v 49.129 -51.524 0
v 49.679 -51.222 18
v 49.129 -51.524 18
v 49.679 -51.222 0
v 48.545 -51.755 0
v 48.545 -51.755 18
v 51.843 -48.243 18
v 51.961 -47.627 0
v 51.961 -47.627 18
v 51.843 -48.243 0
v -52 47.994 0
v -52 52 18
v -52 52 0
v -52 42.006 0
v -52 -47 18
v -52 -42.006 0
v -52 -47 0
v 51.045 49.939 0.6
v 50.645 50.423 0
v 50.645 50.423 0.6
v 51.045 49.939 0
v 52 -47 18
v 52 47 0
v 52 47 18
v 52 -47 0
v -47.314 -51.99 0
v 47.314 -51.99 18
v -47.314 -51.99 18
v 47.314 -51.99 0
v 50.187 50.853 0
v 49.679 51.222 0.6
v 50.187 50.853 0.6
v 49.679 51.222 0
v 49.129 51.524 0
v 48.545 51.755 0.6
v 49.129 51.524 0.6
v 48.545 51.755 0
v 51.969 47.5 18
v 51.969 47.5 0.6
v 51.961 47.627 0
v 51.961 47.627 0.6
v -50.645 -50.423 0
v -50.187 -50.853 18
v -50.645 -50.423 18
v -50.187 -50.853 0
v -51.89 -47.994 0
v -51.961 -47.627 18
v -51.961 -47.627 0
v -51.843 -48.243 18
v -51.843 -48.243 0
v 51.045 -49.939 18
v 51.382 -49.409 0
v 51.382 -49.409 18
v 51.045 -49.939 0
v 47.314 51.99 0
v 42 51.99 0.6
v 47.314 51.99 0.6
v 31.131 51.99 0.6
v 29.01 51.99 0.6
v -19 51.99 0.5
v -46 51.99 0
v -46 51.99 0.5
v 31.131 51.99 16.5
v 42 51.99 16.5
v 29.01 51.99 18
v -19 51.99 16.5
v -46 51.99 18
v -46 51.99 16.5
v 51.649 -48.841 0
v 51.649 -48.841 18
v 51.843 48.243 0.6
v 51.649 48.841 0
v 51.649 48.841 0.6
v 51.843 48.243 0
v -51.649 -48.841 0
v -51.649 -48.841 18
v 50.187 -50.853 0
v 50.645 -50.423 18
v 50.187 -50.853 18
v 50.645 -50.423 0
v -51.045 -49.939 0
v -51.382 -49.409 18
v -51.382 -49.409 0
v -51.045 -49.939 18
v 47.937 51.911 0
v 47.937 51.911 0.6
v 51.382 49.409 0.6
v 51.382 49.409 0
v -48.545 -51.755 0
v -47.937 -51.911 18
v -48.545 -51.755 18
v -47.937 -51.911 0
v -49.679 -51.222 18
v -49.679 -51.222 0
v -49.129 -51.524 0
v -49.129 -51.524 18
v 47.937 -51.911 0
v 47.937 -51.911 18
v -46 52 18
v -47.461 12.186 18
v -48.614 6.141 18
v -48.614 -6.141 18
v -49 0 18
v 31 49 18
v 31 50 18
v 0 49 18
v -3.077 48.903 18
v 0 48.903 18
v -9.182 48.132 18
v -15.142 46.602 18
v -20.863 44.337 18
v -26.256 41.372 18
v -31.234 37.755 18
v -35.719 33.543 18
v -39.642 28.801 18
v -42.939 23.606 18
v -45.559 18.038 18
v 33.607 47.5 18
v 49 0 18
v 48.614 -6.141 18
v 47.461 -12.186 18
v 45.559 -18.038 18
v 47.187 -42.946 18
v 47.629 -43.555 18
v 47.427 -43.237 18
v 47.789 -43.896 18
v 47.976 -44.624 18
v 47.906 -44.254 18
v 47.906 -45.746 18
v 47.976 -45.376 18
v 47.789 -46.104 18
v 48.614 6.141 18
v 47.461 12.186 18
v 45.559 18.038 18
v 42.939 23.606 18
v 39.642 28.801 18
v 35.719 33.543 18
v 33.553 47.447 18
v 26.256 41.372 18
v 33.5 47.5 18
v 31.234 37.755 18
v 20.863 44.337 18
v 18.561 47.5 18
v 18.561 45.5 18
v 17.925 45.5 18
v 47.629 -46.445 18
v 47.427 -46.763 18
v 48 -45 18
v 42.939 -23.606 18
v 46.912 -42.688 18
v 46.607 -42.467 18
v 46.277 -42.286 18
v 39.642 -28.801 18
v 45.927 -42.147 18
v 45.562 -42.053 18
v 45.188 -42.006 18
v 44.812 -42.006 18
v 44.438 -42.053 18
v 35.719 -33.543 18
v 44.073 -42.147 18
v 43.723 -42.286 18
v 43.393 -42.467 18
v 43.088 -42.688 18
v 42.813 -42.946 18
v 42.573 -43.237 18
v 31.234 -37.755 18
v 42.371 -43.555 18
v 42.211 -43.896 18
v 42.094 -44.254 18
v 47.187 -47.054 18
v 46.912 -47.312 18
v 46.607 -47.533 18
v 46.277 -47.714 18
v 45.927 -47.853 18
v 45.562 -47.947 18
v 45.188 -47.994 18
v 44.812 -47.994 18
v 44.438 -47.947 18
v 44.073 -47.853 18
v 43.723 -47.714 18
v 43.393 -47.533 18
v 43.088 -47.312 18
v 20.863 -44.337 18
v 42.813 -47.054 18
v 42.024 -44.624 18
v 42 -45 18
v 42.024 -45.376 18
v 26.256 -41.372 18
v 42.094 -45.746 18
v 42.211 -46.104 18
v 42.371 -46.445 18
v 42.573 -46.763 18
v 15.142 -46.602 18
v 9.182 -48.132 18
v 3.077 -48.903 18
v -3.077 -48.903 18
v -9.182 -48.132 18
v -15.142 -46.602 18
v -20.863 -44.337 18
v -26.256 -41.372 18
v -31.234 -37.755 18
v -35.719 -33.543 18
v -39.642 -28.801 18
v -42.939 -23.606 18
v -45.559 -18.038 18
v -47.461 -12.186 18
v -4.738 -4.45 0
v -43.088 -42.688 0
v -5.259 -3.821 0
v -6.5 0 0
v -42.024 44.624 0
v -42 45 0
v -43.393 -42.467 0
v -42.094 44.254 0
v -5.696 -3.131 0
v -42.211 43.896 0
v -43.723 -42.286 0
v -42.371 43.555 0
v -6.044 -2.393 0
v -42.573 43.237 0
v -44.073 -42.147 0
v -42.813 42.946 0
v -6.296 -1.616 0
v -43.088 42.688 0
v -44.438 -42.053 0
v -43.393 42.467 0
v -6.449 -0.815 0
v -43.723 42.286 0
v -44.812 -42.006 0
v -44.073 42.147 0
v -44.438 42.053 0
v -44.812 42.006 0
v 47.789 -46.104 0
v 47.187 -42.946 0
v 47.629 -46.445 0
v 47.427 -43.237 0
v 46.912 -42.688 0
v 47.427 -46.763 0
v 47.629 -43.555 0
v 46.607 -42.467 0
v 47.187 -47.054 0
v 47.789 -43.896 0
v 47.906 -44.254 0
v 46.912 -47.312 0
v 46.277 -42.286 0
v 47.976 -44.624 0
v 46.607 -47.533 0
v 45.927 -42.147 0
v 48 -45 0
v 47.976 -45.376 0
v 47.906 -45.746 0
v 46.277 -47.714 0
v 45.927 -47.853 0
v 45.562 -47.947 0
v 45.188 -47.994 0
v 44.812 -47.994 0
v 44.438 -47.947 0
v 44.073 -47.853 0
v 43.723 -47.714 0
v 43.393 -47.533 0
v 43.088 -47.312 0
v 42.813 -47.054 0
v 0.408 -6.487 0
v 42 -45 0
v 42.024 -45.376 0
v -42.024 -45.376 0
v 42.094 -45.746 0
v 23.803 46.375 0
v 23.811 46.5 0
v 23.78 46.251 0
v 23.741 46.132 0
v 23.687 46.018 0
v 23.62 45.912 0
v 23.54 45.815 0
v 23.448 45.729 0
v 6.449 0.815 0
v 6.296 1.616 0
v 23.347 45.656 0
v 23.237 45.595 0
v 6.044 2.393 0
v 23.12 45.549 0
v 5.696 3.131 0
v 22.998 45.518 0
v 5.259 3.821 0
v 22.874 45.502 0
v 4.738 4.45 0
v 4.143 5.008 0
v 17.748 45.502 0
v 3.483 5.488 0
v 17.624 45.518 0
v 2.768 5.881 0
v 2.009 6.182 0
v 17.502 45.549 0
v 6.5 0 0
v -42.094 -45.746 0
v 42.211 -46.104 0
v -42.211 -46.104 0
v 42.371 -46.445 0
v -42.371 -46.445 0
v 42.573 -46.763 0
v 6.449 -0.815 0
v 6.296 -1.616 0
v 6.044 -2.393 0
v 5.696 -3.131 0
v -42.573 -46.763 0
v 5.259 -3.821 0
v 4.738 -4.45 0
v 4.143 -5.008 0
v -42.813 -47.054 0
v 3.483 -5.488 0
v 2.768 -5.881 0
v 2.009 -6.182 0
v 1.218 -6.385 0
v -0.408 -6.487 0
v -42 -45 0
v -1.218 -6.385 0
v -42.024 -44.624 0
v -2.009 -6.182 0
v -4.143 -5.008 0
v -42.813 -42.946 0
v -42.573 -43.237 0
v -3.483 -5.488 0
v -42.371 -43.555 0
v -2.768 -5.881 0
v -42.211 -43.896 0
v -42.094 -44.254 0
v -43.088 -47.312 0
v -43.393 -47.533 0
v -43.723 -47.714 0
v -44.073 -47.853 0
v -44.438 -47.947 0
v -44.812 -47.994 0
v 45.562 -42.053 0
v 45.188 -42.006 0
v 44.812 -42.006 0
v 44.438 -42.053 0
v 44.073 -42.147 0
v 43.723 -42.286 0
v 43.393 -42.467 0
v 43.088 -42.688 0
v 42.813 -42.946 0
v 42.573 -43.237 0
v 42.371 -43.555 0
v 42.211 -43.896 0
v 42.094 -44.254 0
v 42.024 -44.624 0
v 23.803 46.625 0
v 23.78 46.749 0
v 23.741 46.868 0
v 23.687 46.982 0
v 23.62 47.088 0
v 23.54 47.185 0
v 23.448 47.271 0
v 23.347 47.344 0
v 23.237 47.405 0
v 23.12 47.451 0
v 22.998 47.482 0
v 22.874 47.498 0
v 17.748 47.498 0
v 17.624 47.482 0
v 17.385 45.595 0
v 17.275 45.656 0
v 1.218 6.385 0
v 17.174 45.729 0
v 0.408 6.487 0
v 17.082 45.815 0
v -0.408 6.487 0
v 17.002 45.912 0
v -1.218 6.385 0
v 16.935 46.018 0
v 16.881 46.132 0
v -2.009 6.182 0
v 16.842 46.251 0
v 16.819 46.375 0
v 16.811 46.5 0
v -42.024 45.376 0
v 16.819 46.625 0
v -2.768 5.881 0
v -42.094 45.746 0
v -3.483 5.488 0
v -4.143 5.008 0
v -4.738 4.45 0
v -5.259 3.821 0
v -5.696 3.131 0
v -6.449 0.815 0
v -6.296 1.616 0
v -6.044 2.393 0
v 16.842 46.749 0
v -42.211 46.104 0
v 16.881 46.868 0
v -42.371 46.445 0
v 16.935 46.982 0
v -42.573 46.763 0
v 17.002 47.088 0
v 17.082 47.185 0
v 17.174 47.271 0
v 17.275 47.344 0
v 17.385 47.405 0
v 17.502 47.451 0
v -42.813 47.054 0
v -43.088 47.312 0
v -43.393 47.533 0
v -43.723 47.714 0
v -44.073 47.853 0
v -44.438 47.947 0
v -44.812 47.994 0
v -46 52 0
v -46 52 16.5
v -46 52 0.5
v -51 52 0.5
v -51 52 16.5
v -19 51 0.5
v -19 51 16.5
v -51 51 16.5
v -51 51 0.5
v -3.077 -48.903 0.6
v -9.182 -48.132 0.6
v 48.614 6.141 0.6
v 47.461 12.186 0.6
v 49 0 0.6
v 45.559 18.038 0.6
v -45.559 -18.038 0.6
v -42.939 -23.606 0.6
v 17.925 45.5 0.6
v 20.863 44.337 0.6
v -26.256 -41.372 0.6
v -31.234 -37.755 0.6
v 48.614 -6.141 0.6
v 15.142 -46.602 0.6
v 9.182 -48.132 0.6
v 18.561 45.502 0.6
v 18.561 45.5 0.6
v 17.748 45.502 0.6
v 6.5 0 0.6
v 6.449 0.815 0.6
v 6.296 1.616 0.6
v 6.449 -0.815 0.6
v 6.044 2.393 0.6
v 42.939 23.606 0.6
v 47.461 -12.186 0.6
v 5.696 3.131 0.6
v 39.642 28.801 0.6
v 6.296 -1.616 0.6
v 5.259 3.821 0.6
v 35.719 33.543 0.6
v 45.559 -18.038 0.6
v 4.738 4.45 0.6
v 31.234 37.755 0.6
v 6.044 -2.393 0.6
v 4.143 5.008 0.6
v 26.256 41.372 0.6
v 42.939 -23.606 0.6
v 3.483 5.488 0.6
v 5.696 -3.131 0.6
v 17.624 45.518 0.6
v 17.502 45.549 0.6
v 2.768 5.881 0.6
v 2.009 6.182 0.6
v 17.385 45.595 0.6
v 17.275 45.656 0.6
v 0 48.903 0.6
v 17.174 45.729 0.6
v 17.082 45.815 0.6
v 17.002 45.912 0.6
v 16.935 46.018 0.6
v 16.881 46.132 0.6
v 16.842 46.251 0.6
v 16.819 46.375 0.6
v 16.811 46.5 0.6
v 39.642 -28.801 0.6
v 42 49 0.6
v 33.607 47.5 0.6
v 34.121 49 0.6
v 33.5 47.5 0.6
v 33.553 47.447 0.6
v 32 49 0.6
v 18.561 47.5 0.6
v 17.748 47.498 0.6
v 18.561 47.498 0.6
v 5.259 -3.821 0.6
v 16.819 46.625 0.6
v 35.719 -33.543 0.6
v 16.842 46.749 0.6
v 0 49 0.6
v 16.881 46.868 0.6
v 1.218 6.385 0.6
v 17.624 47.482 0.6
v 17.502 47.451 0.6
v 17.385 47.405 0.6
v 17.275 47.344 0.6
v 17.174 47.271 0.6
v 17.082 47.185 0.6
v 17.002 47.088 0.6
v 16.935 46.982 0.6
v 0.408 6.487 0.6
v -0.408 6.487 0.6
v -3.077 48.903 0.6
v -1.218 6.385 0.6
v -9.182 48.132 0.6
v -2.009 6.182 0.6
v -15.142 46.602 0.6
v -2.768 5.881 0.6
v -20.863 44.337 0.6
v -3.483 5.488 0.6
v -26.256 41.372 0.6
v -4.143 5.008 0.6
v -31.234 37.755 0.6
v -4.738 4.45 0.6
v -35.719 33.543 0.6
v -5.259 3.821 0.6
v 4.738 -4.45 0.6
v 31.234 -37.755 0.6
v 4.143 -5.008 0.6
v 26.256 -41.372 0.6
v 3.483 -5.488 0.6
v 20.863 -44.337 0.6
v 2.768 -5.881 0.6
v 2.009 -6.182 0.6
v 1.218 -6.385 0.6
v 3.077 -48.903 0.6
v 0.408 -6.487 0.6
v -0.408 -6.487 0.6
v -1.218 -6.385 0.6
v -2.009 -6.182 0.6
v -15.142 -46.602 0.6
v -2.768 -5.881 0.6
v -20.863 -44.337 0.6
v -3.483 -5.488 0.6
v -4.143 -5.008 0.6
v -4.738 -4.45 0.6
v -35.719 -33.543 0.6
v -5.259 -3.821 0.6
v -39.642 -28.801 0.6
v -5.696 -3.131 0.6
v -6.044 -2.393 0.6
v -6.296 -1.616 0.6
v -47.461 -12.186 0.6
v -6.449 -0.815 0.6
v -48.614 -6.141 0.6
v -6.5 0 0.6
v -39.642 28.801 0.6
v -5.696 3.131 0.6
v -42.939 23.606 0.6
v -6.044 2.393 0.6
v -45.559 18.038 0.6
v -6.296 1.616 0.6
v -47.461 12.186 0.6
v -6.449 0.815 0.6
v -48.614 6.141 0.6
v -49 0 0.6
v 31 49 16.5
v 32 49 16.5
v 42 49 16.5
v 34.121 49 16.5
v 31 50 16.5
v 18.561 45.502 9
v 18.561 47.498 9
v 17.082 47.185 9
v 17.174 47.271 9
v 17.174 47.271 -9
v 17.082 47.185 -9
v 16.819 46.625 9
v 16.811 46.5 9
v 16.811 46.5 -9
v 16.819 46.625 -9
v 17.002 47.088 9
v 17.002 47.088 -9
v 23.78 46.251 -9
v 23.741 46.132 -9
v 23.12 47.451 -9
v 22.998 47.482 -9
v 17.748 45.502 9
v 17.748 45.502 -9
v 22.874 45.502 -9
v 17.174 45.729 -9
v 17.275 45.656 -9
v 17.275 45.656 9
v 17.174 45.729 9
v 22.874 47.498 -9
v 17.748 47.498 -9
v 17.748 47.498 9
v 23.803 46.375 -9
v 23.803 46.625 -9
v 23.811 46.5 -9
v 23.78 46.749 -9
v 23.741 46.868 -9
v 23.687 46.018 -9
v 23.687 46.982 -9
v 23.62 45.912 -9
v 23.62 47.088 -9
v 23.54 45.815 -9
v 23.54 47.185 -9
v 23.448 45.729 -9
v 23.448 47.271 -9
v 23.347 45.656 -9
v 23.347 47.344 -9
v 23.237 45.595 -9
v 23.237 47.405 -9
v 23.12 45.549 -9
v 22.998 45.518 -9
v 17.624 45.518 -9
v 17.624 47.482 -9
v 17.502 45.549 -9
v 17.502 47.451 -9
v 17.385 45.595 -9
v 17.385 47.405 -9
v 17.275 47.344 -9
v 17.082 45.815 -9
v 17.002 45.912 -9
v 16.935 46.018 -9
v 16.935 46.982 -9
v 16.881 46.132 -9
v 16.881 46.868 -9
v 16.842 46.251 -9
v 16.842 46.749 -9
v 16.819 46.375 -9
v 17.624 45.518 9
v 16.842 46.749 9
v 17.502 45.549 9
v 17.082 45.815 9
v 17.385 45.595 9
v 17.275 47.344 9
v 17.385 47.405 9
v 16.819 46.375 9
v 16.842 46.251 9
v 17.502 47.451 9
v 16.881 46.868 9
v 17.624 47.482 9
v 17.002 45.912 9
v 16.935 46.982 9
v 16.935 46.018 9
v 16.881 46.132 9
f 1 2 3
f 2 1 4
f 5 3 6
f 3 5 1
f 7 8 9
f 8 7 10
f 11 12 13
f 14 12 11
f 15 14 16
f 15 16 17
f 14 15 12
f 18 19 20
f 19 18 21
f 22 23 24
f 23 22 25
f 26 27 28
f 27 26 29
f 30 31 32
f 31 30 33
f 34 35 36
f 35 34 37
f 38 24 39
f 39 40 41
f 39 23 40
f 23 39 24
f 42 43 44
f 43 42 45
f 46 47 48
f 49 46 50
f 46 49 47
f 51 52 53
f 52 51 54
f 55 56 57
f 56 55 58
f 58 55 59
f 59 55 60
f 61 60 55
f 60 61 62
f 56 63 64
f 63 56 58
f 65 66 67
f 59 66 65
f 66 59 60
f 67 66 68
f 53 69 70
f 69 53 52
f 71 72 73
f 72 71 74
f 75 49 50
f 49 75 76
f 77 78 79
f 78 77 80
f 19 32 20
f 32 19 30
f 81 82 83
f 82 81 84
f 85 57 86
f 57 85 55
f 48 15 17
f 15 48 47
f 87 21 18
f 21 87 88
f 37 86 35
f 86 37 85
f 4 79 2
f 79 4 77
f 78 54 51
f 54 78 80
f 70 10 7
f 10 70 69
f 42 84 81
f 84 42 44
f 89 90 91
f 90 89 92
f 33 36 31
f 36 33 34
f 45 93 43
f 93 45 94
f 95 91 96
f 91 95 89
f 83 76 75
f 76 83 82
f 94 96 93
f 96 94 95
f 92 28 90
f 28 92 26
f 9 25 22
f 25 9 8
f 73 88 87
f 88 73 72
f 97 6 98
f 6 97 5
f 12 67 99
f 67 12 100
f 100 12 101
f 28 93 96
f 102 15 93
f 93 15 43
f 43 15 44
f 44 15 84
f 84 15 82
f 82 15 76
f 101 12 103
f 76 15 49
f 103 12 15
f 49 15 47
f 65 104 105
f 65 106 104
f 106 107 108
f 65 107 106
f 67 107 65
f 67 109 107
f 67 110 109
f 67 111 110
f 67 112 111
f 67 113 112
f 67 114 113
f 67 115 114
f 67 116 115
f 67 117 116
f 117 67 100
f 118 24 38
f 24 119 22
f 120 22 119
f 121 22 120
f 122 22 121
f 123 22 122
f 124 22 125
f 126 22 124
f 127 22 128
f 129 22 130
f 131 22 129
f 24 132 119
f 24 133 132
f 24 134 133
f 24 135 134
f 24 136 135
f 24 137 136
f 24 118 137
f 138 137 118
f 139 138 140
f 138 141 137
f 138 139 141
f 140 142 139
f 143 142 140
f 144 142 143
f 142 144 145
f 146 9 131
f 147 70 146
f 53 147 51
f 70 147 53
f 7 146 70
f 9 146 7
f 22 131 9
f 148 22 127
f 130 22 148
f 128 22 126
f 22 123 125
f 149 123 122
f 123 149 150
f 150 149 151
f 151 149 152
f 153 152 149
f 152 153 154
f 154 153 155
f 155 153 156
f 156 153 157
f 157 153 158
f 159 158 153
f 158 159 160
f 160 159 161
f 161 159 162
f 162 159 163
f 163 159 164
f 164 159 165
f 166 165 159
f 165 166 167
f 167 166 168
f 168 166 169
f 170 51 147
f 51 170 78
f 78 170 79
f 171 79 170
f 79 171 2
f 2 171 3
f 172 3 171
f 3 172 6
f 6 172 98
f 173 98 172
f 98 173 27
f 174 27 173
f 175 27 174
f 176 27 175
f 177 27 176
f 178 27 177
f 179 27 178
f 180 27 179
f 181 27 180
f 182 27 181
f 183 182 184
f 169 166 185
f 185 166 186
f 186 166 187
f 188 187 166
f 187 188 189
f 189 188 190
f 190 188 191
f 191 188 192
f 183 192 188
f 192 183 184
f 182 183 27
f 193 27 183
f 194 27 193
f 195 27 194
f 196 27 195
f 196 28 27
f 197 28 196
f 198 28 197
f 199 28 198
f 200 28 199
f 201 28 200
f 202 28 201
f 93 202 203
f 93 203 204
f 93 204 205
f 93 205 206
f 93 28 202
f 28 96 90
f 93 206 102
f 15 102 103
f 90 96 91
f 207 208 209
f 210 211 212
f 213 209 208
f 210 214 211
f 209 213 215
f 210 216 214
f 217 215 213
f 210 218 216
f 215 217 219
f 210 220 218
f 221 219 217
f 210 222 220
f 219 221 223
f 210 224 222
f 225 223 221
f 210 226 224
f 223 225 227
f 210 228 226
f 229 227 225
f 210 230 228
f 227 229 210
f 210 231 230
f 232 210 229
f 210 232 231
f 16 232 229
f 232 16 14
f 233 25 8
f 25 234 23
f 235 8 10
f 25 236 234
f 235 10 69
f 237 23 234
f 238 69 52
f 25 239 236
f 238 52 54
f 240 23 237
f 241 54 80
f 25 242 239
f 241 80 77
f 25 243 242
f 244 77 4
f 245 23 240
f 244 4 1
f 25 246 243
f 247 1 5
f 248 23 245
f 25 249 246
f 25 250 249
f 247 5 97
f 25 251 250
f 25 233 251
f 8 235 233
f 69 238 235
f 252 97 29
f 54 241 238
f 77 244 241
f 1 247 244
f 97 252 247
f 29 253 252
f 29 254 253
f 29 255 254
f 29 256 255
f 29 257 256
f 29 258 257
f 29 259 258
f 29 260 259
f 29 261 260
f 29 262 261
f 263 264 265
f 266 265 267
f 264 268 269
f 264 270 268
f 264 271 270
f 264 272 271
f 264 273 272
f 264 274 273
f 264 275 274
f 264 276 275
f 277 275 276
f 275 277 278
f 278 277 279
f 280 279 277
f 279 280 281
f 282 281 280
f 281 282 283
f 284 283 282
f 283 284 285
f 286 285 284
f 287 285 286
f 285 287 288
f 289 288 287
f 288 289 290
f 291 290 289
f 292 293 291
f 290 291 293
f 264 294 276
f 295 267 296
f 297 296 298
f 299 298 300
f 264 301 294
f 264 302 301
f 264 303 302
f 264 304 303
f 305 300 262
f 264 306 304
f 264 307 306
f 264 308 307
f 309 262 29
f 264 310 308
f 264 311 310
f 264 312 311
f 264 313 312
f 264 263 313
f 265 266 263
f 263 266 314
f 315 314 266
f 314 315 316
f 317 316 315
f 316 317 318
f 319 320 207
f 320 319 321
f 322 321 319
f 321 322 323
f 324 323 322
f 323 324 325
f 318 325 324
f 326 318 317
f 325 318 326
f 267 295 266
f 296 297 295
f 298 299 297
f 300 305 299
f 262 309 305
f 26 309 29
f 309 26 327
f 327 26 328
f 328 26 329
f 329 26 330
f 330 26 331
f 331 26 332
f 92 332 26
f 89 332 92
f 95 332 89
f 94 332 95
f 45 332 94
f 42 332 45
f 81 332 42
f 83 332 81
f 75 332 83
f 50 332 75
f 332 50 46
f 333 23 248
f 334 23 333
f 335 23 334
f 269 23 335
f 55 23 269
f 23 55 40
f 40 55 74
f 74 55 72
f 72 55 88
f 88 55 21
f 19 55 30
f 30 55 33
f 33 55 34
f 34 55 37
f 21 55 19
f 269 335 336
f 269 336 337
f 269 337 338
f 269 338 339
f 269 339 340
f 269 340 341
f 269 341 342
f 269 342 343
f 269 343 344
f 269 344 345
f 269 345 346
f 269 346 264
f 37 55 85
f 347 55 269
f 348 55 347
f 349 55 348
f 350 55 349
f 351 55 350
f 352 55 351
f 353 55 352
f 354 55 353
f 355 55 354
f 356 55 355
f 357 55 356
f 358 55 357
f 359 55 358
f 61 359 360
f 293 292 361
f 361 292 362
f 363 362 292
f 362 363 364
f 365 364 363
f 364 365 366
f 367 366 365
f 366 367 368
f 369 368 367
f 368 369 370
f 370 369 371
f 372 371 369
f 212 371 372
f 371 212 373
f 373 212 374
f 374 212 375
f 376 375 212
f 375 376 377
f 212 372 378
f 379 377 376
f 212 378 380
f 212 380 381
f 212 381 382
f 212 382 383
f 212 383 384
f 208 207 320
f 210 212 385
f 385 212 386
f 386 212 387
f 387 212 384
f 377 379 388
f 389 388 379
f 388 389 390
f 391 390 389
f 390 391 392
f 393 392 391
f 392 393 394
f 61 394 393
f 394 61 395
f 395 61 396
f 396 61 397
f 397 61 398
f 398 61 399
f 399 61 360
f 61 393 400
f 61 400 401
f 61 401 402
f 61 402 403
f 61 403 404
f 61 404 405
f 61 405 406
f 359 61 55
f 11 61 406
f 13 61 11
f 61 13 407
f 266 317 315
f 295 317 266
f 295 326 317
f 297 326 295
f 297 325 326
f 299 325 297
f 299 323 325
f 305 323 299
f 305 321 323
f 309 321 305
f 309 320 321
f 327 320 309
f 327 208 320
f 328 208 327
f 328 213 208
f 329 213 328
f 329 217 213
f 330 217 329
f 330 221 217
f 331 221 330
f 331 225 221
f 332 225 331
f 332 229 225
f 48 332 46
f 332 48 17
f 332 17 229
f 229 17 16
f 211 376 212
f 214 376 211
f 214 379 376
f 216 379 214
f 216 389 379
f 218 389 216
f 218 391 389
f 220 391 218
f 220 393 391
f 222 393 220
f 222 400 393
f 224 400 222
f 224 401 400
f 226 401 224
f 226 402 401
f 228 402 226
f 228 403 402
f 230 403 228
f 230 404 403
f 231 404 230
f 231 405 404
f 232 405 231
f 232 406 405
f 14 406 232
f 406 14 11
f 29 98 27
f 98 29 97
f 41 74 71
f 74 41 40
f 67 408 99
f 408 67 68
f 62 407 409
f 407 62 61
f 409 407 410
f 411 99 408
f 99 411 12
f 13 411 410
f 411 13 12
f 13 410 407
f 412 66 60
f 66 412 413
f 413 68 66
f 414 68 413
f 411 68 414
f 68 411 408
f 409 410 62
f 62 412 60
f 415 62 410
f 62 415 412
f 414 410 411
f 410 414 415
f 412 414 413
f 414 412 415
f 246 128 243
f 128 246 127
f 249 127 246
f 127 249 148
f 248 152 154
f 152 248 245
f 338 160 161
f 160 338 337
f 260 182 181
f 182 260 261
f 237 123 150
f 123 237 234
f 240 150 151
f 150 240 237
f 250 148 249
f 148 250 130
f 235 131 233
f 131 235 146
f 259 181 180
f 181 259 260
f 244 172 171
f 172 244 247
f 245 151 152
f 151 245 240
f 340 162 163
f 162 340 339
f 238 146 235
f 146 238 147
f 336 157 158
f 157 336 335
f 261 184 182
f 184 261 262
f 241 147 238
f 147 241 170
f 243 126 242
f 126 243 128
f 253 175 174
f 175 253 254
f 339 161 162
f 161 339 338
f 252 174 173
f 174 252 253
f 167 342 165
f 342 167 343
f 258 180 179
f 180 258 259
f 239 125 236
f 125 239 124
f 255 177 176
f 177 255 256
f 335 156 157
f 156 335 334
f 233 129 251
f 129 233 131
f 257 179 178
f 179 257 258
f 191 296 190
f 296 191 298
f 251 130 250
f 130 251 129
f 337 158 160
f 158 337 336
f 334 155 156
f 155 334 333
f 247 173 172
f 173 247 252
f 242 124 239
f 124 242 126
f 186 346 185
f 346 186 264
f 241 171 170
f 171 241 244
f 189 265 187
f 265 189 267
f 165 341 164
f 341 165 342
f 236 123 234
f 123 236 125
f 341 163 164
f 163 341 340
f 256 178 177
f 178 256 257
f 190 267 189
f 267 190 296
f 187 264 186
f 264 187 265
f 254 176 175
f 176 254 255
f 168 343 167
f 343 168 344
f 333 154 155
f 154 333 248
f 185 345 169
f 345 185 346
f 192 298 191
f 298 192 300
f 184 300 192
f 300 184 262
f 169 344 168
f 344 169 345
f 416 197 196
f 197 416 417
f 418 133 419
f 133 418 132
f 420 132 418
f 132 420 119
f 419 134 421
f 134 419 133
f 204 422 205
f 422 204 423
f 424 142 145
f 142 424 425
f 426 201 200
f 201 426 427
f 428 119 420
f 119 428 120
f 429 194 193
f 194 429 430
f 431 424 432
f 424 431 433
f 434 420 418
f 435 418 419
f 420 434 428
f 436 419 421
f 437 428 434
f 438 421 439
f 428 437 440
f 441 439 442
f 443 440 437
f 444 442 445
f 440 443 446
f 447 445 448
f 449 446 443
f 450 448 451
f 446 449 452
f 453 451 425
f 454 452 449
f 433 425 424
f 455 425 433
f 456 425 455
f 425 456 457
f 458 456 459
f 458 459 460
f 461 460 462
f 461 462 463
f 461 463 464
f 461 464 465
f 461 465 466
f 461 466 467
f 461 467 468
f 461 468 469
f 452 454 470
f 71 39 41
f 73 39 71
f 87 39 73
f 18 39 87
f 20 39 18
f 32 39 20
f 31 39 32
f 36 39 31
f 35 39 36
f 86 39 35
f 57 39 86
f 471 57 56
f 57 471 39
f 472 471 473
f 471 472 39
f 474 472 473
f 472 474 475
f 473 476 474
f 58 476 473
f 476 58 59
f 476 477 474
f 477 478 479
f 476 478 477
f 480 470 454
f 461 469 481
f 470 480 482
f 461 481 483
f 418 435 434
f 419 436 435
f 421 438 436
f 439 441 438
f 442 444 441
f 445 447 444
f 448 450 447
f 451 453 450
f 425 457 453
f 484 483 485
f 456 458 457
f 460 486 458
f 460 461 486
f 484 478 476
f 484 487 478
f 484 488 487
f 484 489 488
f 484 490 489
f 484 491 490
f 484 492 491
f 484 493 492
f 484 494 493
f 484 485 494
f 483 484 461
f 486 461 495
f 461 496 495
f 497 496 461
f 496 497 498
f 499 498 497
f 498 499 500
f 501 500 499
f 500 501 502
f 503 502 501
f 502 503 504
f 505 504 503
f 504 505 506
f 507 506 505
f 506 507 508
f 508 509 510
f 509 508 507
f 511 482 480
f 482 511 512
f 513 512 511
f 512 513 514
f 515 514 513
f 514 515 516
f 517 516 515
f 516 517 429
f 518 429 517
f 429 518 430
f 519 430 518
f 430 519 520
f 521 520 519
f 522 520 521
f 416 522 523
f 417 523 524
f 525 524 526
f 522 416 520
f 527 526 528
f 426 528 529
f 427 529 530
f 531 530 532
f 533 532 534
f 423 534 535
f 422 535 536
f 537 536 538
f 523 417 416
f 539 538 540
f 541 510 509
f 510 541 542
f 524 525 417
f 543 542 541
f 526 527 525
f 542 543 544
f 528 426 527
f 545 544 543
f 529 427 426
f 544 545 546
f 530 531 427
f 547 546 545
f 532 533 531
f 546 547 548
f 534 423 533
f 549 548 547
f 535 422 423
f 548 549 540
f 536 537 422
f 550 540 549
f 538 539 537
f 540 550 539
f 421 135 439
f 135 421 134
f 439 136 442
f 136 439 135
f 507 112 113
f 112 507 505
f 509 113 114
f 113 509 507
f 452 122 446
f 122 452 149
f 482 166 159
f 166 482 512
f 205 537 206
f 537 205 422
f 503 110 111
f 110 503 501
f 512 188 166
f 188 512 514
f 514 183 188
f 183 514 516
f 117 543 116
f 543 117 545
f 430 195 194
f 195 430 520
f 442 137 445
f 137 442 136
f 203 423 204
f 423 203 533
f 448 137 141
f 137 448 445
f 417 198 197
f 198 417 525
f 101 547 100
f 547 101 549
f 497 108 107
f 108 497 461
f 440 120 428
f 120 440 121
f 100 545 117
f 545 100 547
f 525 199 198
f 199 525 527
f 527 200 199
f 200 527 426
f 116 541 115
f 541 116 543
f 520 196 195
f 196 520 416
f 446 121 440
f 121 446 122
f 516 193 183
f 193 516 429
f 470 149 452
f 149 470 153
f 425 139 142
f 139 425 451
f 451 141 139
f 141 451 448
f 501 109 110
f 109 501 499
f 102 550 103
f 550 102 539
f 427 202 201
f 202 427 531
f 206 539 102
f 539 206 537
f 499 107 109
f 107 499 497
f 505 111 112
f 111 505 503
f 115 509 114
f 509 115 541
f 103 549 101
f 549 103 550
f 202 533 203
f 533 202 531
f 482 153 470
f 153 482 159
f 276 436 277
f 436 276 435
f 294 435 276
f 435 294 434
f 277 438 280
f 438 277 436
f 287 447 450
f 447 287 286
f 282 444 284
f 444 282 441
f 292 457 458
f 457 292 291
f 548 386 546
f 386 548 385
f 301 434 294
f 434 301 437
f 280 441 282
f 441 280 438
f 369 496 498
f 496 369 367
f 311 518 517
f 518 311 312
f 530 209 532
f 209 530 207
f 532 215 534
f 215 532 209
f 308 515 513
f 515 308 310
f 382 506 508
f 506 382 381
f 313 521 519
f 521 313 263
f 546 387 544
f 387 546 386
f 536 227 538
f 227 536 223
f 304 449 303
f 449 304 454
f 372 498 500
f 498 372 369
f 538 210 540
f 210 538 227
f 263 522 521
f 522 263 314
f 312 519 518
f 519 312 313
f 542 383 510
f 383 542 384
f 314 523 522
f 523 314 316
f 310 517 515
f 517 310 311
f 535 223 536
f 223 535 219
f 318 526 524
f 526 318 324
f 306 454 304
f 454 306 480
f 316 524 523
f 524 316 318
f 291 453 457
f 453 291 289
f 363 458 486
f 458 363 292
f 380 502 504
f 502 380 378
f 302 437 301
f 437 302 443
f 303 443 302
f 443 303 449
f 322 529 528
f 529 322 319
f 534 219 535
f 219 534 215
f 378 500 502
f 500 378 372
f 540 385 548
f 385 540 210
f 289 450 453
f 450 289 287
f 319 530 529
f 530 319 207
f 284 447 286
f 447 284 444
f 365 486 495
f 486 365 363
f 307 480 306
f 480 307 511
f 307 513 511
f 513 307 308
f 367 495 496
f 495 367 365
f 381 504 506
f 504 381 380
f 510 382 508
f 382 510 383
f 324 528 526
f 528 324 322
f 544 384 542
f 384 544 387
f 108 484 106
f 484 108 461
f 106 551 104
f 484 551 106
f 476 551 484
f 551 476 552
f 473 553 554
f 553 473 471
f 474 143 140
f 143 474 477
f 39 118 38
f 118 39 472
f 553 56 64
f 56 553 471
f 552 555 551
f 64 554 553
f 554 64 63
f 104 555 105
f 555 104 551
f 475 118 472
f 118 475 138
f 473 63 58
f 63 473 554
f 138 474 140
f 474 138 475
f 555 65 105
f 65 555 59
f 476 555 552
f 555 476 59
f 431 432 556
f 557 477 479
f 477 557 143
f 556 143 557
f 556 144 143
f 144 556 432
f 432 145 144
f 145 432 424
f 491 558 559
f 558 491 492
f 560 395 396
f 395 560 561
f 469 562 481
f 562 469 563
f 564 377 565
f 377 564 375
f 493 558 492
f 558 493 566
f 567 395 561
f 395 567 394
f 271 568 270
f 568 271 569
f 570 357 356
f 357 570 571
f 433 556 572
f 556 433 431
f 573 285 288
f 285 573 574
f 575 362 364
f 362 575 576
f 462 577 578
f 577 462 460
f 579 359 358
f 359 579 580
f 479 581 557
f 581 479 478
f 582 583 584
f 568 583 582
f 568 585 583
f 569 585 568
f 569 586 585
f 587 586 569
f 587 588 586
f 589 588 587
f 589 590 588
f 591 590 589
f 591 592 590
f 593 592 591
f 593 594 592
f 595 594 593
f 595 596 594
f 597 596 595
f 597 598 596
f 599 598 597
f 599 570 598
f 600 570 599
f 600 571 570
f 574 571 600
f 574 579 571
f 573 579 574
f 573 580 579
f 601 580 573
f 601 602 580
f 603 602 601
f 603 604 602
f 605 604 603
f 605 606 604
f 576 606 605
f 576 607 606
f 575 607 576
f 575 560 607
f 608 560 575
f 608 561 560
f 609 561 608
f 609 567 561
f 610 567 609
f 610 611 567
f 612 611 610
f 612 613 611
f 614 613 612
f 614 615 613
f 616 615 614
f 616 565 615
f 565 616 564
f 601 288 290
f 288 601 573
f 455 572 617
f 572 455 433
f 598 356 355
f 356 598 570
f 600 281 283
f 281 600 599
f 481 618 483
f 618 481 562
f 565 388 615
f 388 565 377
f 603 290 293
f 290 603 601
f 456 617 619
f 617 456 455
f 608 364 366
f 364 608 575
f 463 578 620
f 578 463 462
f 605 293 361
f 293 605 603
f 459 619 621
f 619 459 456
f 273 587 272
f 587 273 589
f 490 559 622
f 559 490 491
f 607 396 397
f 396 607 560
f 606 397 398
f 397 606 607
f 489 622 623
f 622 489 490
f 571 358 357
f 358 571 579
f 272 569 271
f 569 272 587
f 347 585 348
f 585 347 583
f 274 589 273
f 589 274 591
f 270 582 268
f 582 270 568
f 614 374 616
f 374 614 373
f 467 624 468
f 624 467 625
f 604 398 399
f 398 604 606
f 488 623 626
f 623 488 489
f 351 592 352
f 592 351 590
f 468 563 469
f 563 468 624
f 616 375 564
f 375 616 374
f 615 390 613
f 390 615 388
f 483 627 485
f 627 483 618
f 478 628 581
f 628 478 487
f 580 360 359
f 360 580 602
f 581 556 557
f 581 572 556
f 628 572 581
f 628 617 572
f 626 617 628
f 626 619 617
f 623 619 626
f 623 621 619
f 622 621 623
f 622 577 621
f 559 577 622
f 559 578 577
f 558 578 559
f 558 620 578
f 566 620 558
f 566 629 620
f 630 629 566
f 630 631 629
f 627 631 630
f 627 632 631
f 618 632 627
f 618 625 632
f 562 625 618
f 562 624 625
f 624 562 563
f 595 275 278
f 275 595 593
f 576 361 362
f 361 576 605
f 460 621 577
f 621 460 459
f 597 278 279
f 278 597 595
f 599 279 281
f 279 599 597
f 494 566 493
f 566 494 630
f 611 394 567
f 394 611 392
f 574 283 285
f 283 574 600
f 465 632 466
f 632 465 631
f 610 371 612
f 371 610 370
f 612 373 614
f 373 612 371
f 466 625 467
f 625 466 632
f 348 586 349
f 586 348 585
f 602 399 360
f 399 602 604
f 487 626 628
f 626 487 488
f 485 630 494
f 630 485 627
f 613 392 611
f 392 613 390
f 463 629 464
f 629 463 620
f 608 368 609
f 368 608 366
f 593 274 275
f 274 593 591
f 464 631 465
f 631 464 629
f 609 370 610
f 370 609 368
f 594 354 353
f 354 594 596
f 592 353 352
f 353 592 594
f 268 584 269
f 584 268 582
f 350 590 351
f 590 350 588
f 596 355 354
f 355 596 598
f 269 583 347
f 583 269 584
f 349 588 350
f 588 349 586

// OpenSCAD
$fn = 50;


union() {
	difference() {
		union() {
			hull() {
				translate(v = [-47.0000000000, 47.0000000000, 0]) {
					cylinder(h = 18, r = 5);
				}
				translate(v = [47.0000000000, 47.0000000000, 0]) {
					cylinder(h = 18, r = 5);
				}
				translate(v = [-47.0000000000, -47.0000000000, 0]) {
					cylinder(h = 18, r = 5);
				}
				translate(v = [47.0000000000, -47.0000000000, 0]) {
					cylinder(h = 18, r = 5);
				}
			}
			translate(v = [-52.0000000000, 46.0000000000, 0]) {
				cube(size = [6, 6, 18]);
			}
		}
		union() {
			translate(v = [-52.5000000000, -45.0000000000, -250.0000000000]) {
				rotate(a = [0, 0, 0]) {
					difference() {
						union() {
							hull() {
								translate(v = [7.5000000000, 0, 0]) {
									cylinder(h = 250, r = 3.0000000000, r1 = 3.0000000000, r2 = 3.0000000000);
								}
								translate(v = [-7.5000000000, 0, 0]) {
									cylinder(h = 250, r = 3.0000000000, r1 = 3.0000000000, r2 = 3.0000000000);
								}
							}
						}
						union();
					}
				}
			}
			translate(v = [-52.5000000000, 45.0000000000, -250.0000000000]) {
				rotate(a = [0, 0, 0]) {
					difference() {
						union() {
							hull() {
								translate(v = [7.5000000000, 0, 0]) {
									cylinder(h = 250, r = 3.0000000000, r1 = 3.0000000000, r2 = 3.0000000000);
								}
								translate(v = [-7.5000000000, 0, 0]) {
									cylinder(h = 250, r = 3.0000000000, r1 = 3.0000000000, r2 = 3.0000000000);
								}
							}
						}
						union();
					}
				}
			}
			translate(v = [-51.0000000000, 51.0000000000, 0.5000000000]) {
				cube(size = [32, 1, 16]);
			}
			translate(v = [45.0000000000, -45.0000000000, 0]) {
				cylinder(h = 100, r = 3.0000000000);
			}
			translate(v = [0, 0, 0.6000000000]) {
				cylinder(h = 20.4000000000, r = 49.0000000000);
			}
			translate(v = [0, 0, -9.0000000000]) {
				cylinder(h = 18, r = 6.5000000000);
			}
			translate(v = [0.0000000000, 47.5000000000, 0.6000000000]) {
				cube(size = [52.0000000000, 1.5000000000, 20.4000000000]);
			}
			translate(v = [42.0000000000, 47.5000000000, 0.6000000000]) {
				cube(size = [10, 4.5000000000, 20.4000000000]);
			}
			translate(v = [31.0000000000, 47.5000000000, 16.5000000000]) {
				cube(size = [21, 4.5000000000, 1.5000000000]);
			}
			translate(v = [28.2500000000, 52.7500000000, 0.6000000000]) {
				rotate(a = [0, 0, -45]) {
					cube(size = [7.5000000000, 1.5000000000, 20.4000000000]);
				}
			}
			translate(v = [11.0610000000, 45.5000000000, 0.6000000000]) {
				cube(size = [7.5000000000, 2, 17.4000000000]);
			}
		}
	}
	union() {
		translate(v = [20.3110000000, 46.5000000000, -9.0000000000]) {
			rotate(a = [0, 0, 0]) {
				difference() {
					union() {
						#hull() {
							#translate(v = [2.5000000000, 0, 0]) {
								cylinder(h = 18, r = 1.0000000000, r1 = 1.0000000000, r2 = 1.0000000000);
							}
							#translate(v = [-2.5000000000, 0, 0]) {
								cylinder(h = 18, r = 1.0000000000, r1 = 1.0000000000, r2 = 1.0000000000);
							}
						}
					}
					union();
				}
			}
		}
	}
}
